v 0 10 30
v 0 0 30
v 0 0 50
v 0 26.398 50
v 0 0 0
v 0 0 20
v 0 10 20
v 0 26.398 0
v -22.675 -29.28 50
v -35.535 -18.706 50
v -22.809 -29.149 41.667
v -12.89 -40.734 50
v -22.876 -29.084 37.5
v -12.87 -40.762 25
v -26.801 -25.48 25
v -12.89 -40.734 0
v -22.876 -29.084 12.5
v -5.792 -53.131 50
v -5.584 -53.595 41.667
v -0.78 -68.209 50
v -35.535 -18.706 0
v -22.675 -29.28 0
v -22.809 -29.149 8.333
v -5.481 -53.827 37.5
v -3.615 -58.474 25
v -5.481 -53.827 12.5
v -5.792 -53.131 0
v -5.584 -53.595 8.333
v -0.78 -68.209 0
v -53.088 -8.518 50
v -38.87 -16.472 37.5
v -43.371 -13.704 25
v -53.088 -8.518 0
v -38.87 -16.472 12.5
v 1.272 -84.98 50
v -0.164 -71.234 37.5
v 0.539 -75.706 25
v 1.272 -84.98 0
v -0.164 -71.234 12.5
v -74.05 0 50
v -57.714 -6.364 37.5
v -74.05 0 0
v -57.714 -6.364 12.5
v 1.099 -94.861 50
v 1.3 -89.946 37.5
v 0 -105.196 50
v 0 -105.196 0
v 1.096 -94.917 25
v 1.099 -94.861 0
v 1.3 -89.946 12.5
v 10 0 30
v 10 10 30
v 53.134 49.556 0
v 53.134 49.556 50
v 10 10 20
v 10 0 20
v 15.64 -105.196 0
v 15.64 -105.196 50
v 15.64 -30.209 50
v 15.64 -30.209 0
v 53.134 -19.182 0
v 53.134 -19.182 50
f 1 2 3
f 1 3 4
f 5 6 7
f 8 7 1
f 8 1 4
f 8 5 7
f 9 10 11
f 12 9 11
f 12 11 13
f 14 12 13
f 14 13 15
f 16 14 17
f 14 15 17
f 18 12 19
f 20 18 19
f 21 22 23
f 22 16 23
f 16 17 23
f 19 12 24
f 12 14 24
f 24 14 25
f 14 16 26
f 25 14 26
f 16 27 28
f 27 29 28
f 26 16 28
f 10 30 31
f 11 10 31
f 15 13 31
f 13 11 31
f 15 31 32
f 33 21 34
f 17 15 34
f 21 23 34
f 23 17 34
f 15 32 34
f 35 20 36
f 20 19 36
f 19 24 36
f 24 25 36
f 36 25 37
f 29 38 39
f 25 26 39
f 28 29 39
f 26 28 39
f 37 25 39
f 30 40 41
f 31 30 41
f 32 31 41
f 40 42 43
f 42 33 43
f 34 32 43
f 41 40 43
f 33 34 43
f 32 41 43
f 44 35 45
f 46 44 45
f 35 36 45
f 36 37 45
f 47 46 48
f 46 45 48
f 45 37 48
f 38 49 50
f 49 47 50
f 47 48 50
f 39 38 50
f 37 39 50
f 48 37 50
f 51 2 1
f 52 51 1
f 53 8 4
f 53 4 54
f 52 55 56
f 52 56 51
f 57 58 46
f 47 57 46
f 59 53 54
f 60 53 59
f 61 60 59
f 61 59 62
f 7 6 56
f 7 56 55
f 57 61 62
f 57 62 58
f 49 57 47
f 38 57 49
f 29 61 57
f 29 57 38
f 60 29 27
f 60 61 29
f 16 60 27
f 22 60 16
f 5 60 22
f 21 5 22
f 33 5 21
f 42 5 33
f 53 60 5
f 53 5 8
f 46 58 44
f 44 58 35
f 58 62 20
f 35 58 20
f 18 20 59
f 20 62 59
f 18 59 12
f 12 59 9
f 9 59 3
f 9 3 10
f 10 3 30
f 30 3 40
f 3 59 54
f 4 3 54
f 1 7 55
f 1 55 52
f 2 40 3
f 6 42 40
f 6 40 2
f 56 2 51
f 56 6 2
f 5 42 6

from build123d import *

# Parameters (mm, degrees)
EXTRUDE_1_DEPTH     = 50
SKETCH_2_W          = 10
SKETCH_2_H          = 10
CUT_EXTRUDE_1_DEPTH = 10


with BuildPart() as part:
    # 草圖1 → 填料-伸長1 (new body)
    with BuildSketch(Plane.XY):
        with BuildLine():
            Line((-74.049587352, 0), (0, 0))
            Line((0, 0), (0, 26.398160535))
            Line((0, 26.398160535), (53.133849001, 49.556160033))
            Line((53.133849001, 49.556160033), (15.64046603, -30.209174327))
            Line((15.64046603, -30.209174327), (53.133849001, -19.181708747))
            Line((53.133849001, -19.181708747), (15.64046603, -105.195940269))
            Line((15.64046603, -105.195940269), (0, -105.195940269))
            add(Edge.make_bspline(
                [(-74.049587352, 0), (11.284113354, -28.926204628), (0, -105.195940269)],
                knots=[0, 0, 0, 1, 1, 1], degree=2))
        make_face()
    extrude(amount=EXTRUDE_1_DEPTH)

    # 草圖2 → 除料-伸長1 (cut)
    with BuildSketch(Plane.ZY):
        with Locations((25, 5)):
            Rectangle(SKETCH_2_W, SKETCH_2_H)
    extrude(amount=-CUT_EXTRUDE_1_DEPTH, mode=Mode.SUBTRACT)


solid = part.part
